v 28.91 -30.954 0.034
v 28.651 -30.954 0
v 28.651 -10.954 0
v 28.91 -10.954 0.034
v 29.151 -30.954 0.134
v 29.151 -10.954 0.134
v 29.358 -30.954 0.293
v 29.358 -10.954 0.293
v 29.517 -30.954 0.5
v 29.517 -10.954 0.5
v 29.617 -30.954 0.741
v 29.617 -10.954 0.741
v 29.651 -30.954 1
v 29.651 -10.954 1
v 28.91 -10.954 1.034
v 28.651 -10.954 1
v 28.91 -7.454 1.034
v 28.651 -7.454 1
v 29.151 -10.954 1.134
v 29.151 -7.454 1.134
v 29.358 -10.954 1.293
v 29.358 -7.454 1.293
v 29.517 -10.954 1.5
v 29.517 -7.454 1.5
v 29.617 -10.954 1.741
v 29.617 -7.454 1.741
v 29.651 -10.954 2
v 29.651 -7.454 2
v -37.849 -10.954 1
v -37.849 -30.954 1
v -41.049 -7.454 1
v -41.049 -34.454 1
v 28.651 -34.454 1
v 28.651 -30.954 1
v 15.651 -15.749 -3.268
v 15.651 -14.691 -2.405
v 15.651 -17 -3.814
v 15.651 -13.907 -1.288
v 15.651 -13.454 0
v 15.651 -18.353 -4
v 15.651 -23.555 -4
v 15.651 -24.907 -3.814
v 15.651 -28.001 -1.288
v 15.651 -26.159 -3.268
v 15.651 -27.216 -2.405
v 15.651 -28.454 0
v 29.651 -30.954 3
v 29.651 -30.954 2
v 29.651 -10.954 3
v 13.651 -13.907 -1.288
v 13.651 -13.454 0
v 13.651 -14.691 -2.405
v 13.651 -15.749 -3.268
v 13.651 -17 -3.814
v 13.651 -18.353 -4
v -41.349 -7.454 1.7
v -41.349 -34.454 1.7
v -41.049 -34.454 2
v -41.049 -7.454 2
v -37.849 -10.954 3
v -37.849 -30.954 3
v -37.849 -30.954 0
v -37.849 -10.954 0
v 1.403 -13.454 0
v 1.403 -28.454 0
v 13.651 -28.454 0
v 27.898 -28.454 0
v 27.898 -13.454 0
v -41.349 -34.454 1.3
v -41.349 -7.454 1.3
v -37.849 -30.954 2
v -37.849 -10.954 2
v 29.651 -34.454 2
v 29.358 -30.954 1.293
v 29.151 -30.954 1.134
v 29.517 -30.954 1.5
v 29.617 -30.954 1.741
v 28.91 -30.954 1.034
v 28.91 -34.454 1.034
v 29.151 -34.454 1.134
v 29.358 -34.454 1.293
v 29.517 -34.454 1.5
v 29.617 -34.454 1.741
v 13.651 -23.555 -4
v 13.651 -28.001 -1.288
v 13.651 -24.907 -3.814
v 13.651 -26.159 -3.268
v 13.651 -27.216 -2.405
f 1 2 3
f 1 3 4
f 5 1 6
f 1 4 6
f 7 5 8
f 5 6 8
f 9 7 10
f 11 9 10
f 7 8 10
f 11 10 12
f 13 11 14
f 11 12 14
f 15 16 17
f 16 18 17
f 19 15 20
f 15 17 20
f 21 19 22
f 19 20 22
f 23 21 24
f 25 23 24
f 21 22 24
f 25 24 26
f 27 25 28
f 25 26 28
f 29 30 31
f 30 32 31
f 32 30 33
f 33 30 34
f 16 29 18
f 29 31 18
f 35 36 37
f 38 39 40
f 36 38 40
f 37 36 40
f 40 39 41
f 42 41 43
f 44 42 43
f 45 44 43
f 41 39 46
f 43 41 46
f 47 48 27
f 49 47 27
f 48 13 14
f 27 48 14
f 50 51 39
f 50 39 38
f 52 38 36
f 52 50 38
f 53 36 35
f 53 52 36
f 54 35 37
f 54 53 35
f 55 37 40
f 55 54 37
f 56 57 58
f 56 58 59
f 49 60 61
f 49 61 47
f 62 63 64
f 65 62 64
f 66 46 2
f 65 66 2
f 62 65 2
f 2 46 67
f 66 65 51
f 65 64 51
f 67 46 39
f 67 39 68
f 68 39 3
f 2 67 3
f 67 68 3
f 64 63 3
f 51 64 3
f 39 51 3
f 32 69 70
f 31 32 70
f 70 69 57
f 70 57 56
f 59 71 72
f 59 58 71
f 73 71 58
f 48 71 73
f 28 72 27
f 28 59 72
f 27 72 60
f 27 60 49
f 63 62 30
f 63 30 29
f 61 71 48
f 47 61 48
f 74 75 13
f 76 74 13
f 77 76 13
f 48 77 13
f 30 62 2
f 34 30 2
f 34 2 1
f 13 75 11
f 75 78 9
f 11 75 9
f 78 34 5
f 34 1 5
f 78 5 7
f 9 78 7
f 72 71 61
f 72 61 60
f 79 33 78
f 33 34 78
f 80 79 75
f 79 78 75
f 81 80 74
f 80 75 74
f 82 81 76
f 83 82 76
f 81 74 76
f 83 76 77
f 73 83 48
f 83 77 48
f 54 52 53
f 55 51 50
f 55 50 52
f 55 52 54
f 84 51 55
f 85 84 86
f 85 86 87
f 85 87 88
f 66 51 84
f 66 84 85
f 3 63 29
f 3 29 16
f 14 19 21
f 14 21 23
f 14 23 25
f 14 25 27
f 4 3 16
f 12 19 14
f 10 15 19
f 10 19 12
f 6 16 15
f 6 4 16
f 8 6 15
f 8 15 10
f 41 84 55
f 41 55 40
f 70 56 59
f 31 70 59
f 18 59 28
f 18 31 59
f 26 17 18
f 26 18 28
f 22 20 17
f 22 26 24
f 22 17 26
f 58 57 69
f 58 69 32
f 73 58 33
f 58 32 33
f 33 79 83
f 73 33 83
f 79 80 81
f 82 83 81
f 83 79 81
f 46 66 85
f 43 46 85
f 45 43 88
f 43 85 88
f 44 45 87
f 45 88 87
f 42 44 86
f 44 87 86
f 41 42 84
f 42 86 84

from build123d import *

# Parameters (mm, degrees)
F0_W         = 67.5
F0_H         = 20
F1_DEPTH     = 1
F2_W         = 71
F2_H         = 27
F3_DEPTH     = 1
F4_W         = 67.5
F4_H         = 20
F5_DEPTH     = 1
F6_R         = 0.99999
F7_R         = 1
F8_W         = 2
F8_H         = 15
F9_DEPTH     = 4
F10_T1_DEPTH = 26.4948974279
F11_SIZE     = 0.3


# Not quite as in the source:
# - a fillet or chamfer that OpenCascade refuses, or shapes differently, is made with other operations: its cross-section is extruded or revolved along the edge and cut away or added
# - a fillet or chamfer is up to 0.001 mm smaller than in the source, because OpenCascade refuses the exact size


with BuildPart() as f1:
    # F0 (on Top) → F1 (new body)
    with BuildSketch(Plane.XY):
        with Locations((-4.0991377383, -20.9536040443)):
            Rectangle(F0_W, F0_H)
    extrude(amount=F1_DEPTH)

    # F2 (on face) → F3 (join)
    with BuildSketch(Plane.XY.offset(1)):
        with Locations((-5.8491377383, -20.9536040443)):
            Rectangle(F2_W, F2_H)
    extrude(amount=F3_DEPTH)

    # F4 (on face) → F5 (join)
    with BuildSketch(Plane.XY.offset(2)):
        with Locations((-4.0991377383, -20.9536040443)):
            Rectangle(F4_W, F4_H)
    extrude(amount=F5_DEPTH)

    # F6 (radius 1 in the source; OpenCascade refuses exactly that, so slightly less here)
    f6_edges = [f1.edges().sort_by_distance(p)[0] for p in [
        (29.650862, -9.203604, 1),
        (29.650862, -32.703604, 1),
    ]]
    fillet(f6_edges, radius=F6_R)

    # F7
    f7_edges = [f1.edges().sort_by_distance(p)[0] for p in [
        (29.650862, -20.953604, 0),
    ]]
    fillet(f7_edges, radius=F7_R)

    # F8 (on face) → F9 (join)
    with BuildSketch(Plane(origin=(0, 0, 0), x_dir=(1, 0, 0), z_dir=(0, 0, -1))):
        with Locations((14.6508622617, 20.9536040443)):
            Rectangle(F8_W, F8_H)
    extrude(amount=F9_DEPTH)

    # F10: fillet of radius 5 on 2 edges, made by hand

    # F10_s2 → F10_t1 (cut)
    with BuildSketch(Plane.YZ.offset(1.4034135477)):
        with BuildLine():
            ThreePointArc((-28.4536040443, 0), (-26.7169022189, -2.8729833462), (-23.5546245587, -4))
            Line((-23.5546245587, -4), (-28.4536040443, -4))
            Line((-28.4536040443, -4), (-28.4536040443, 0))
        make_face()
        with BuildLine():
            ThreePointArc((-13.4536040443, 0), (-15.1903058697, -2.8729833462), (-18.3525835299, -4))
            Line((-18.3525835299, -4), (-13.4536040443, -4))
            Line((-13.4536040443, -4), (-13.4536040443, 0))
        make_face()
    extrude(amount=F10_T1_DEPTH, mode=Mode.SUBTRACT)

    # F11
    f11_edges = [f1.edges().sort_by_distance(p)[0] for p in [
        (-41.349138, -20.953604, 2),
        (-41.349138, -20.953604, 1),
    ]]
    chamfer(f11_edges, length=F11_SIZE)


solid = f1.part
